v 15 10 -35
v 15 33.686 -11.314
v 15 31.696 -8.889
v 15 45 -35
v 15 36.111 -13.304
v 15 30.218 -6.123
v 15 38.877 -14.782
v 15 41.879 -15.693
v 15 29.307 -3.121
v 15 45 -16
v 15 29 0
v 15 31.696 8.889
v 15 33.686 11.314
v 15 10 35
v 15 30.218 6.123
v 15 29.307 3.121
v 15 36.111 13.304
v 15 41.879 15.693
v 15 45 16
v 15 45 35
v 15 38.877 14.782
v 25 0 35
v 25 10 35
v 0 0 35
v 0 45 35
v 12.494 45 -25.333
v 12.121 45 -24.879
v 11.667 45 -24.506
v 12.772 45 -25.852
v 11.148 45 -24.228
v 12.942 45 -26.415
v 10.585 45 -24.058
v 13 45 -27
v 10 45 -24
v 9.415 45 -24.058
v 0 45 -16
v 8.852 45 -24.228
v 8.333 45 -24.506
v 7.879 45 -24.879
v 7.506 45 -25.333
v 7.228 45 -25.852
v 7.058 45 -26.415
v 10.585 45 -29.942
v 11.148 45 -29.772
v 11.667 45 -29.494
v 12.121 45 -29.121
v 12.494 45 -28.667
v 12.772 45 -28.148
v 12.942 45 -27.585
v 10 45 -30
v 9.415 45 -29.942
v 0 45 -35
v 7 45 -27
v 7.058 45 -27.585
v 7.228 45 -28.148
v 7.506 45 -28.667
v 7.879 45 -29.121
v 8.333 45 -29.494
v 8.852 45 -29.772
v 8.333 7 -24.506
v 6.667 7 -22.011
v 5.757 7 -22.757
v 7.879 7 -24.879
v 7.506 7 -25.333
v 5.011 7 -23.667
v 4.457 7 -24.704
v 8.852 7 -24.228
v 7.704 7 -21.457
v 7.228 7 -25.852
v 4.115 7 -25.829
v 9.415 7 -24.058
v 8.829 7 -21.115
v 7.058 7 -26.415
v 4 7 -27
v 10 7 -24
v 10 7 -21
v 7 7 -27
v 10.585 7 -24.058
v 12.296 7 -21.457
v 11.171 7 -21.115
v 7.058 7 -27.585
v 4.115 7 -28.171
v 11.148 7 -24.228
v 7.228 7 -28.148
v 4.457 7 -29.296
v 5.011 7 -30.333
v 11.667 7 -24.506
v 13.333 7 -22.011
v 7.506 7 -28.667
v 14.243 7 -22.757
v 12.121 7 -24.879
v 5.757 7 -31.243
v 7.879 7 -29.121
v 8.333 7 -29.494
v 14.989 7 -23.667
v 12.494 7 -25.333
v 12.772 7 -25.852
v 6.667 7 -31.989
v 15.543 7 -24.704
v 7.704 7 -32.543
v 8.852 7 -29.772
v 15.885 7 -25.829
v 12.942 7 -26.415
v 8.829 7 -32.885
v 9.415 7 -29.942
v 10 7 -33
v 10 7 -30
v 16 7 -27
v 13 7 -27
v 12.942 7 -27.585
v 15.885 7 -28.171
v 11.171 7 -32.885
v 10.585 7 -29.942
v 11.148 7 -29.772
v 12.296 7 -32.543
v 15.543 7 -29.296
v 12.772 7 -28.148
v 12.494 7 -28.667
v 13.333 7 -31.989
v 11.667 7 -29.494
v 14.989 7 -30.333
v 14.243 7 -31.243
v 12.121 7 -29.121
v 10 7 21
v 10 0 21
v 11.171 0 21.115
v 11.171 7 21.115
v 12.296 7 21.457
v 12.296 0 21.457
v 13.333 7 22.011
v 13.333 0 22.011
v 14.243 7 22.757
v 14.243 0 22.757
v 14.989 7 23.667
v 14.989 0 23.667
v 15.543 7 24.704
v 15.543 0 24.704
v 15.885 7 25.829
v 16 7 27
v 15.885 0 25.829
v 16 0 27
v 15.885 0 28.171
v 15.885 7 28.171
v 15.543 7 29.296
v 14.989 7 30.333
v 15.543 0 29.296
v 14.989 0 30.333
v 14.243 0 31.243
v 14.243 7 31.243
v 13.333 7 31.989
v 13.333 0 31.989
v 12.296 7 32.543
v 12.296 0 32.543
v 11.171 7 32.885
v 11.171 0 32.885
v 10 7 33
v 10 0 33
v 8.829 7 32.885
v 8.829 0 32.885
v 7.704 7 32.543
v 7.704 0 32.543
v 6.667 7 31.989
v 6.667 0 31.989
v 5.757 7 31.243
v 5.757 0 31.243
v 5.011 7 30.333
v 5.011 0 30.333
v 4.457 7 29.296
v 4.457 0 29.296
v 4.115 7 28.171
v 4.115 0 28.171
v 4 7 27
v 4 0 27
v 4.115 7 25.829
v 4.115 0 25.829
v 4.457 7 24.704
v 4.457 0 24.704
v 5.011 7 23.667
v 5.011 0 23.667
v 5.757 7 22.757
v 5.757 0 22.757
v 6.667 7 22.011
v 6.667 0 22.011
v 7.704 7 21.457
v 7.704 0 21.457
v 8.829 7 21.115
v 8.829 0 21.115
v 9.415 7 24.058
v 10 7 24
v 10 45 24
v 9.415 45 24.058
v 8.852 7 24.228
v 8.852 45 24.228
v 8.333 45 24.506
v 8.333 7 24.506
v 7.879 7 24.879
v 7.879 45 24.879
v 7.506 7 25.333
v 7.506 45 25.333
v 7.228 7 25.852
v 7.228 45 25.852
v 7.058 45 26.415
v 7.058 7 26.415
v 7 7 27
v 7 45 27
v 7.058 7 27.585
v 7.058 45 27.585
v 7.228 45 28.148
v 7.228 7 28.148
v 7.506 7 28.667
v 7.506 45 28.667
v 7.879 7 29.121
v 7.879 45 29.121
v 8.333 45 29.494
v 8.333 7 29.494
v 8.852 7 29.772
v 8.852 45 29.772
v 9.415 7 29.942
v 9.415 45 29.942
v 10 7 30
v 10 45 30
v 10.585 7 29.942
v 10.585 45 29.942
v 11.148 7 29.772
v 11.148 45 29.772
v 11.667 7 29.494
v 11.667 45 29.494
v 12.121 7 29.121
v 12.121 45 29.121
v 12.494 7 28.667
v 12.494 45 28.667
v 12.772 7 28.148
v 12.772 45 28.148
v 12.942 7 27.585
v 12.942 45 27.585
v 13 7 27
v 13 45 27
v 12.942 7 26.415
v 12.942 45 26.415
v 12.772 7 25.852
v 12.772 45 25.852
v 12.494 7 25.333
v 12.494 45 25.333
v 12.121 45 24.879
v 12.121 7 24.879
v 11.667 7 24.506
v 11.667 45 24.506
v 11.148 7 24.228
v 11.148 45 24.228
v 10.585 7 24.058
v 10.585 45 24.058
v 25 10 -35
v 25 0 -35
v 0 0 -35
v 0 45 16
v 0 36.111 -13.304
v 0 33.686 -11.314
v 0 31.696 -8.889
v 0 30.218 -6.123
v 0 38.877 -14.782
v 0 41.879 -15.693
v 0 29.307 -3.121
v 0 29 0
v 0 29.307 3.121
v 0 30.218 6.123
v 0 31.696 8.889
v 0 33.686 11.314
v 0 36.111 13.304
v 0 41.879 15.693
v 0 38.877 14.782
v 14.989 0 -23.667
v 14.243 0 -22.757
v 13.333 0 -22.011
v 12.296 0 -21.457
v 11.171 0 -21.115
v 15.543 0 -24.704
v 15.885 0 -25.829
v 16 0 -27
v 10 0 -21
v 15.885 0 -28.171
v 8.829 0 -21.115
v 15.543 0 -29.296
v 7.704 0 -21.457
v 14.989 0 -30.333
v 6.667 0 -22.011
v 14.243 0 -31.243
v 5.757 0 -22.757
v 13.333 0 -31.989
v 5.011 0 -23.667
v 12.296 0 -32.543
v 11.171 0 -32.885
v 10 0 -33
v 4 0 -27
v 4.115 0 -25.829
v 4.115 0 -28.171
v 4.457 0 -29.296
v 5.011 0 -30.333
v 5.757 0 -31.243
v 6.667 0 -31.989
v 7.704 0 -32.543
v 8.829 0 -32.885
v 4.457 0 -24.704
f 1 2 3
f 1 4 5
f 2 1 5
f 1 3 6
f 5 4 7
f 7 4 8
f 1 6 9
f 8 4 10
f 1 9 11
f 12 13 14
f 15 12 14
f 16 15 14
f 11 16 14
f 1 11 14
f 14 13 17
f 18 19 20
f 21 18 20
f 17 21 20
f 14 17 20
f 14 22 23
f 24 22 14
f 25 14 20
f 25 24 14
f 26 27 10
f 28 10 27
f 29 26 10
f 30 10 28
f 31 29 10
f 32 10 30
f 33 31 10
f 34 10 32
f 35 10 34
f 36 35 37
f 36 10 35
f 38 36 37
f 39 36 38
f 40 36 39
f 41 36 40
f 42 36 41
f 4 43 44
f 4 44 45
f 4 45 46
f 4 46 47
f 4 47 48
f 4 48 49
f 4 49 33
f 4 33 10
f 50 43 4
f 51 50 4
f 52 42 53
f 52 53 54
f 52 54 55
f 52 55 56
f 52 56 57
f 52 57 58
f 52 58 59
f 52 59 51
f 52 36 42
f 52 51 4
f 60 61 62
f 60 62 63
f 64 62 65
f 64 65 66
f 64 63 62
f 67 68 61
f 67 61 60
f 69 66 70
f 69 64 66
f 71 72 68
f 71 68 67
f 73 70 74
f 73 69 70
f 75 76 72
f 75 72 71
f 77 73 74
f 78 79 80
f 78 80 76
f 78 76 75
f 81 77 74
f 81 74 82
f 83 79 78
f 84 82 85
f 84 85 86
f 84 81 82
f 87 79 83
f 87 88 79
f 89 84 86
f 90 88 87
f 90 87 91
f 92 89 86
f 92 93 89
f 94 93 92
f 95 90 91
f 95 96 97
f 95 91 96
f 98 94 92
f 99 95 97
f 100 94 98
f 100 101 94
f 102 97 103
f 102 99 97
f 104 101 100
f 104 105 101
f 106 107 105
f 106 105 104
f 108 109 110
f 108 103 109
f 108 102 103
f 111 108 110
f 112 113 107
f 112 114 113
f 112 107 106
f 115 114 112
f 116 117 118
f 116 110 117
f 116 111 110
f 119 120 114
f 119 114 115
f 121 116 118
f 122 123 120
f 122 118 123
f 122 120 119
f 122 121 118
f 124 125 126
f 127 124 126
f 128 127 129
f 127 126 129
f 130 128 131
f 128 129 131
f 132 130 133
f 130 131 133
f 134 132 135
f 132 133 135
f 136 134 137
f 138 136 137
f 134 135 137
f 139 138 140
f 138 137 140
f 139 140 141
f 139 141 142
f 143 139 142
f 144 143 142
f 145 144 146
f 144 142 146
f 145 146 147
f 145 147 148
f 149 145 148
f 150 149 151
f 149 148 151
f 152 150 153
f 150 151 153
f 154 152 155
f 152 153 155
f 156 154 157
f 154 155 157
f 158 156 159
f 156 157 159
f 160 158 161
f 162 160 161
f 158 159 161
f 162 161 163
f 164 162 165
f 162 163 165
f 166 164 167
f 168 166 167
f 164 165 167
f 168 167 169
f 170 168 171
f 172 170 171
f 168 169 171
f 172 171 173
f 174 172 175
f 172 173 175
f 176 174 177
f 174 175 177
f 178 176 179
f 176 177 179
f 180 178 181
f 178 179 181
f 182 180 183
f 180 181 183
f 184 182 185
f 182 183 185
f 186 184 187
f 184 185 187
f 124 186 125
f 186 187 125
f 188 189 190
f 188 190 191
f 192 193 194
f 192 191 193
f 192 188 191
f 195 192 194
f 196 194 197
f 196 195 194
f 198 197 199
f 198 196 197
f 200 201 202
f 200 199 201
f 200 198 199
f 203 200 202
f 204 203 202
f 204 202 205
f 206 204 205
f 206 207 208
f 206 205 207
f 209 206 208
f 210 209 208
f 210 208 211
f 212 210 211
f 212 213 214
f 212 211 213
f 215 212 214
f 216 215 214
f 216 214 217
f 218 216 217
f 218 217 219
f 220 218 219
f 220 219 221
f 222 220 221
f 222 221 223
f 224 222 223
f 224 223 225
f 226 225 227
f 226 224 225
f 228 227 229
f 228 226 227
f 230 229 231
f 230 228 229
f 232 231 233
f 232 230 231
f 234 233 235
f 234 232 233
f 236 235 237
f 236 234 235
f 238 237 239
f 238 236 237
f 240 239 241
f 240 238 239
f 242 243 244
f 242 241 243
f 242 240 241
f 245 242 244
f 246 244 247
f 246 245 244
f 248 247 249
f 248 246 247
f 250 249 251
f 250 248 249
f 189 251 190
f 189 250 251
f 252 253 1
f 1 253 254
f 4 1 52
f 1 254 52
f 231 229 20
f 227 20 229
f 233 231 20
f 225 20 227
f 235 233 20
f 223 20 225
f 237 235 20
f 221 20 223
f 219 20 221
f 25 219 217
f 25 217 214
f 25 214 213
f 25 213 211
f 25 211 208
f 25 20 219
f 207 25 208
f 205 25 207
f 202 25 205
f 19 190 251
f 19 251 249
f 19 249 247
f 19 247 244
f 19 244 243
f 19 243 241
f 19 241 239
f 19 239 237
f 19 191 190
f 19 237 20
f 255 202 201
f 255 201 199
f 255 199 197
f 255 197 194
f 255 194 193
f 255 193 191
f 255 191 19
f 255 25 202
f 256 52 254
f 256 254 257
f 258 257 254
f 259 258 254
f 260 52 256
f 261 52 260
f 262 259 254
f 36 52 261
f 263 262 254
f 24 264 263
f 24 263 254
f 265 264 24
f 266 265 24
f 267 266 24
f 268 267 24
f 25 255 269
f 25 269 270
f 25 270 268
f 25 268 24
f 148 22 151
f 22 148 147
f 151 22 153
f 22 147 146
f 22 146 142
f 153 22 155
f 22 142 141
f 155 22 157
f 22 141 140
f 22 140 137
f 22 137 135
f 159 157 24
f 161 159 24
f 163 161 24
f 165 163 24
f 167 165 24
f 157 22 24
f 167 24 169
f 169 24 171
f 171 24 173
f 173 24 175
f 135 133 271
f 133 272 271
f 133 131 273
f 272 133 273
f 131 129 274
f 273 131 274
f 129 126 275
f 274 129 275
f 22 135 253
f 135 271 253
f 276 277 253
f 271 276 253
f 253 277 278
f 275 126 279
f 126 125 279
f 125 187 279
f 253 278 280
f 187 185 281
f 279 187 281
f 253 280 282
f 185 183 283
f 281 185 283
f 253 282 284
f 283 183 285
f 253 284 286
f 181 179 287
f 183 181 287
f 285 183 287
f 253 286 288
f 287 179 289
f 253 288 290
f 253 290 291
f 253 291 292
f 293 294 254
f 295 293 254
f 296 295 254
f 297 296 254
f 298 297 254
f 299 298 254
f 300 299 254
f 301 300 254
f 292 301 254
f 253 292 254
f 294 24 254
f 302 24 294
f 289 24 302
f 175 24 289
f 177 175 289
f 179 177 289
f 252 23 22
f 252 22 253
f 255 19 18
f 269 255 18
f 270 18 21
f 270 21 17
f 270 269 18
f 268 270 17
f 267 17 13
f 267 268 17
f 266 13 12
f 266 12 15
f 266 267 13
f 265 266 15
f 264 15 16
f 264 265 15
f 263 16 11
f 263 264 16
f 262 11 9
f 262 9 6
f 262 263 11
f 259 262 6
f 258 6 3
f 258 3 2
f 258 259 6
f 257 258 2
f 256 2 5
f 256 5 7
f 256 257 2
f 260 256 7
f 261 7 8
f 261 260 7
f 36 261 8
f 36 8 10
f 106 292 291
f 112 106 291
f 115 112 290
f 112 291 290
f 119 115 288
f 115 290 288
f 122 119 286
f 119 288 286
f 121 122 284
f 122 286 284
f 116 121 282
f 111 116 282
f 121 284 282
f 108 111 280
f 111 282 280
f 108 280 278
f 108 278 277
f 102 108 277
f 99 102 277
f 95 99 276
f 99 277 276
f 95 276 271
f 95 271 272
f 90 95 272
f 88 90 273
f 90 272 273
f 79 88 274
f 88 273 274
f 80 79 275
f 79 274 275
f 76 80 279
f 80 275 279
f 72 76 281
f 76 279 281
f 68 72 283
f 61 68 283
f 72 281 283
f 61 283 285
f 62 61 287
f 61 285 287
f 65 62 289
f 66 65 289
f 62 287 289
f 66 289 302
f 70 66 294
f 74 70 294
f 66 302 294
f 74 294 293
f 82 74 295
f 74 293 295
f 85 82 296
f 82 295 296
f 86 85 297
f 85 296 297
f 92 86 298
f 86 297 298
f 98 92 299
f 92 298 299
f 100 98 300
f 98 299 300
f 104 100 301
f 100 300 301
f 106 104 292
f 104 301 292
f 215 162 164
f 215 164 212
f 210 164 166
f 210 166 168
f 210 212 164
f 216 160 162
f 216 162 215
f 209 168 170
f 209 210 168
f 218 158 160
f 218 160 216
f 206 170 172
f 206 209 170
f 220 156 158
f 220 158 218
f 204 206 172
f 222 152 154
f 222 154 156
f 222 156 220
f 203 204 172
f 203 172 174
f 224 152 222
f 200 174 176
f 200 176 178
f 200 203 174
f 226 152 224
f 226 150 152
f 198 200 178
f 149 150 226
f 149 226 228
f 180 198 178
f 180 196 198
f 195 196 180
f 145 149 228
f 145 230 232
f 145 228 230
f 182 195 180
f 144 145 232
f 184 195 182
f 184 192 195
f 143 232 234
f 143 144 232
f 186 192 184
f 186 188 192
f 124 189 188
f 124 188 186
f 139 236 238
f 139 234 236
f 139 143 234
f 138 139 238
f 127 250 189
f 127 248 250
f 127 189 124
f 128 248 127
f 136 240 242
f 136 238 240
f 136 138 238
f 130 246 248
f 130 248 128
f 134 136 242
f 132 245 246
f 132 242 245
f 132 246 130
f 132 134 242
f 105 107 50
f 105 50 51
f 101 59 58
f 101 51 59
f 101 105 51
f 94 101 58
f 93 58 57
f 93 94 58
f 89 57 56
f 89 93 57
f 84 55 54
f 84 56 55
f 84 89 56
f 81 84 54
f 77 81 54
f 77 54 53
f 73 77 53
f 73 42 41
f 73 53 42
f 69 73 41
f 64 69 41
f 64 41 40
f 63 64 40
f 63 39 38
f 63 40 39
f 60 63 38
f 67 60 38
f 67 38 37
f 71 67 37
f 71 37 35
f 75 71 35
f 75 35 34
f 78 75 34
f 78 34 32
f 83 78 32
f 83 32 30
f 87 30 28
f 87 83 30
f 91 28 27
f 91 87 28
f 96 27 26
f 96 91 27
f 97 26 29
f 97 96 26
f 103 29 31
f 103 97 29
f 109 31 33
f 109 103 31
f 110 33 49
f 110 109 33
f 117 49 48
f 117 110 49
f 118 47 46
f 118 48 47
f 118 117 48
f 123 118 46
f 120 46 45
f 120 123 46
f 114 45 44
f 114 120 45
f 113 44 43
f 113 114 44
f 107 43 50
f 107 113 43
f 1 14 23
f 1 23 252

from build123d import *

# Parameters (mm, degrees)
BOSS_EXTRUDE1_DEPTH = 15
SKETCH2_R           = 3
CUT_EXTRUDE1_DEPTH  = 59.949130613
SKETCH3_W           = 70
SKETCH3_H           = 10
BOSS_EXTRUDE2_DEPTH = 10
SKETCH4_R           = 6
CUT_EXTRUDE2_DEPTH  = 7


with BuildPart() as part:
    # Sketch1 → Boss-Extrude1 (new body)
    with BuildSketch(Plane(origin=(0, 0, 0), x_dir=(0, 0, -1), z_dir=(1, 0, 0))):
        with BuildLine():
            Line((16, 45), (35, 45))
            Line((35, 45), (35, 0))
            Line((35, 0), (-35, 0))
            Line((-35, 0), (-35, 45))
            Line((-35, 45), (-16, 45))
            ThreePointArc((-16, 45), (0, 29), (16, 45))
        make_face()
    extrude(amount=BOSS_EXTRUDE1_DEPTH)

    # Sketch2 → Cut-Extrude1 (cut, through all)
    with BuildSketch(Plane(origin=(0, 0, 0), x_dir=(1, 0, 0), z_dir=(0, 1, 0))):
        with Locations(Location((10, -27, 0), (0, 0, 90))):
            Circle(SKETCH2_R)
        with Locations(Location((10, 27, 0), (0, 0, 90))):
            Circle(SKETCH2_R)
    extrude(amount=CUT_EXTRUDE1_DEPTH, mode=Mode.SUBTRACT)

    # Sketch3 → Boss-Extrude2 (add)
    with BuildSketch(Plane(origin=(15, 0, 0), x_dir=(0, 0, -1), z_dir=(1, 0, 0))):
        with Locations((0, 5)):
            Rectangle(SKETCH3_W, SKETCH3_H)
    extrude(amount=BOSS_EXTRUDE2_DEPTH)

    # Sketch4 → Cut-Extrude2 (cut)
    with BuildSketch(Plane.XZ):
        with Locations(Location((10, 27, 0), (0, 0, 270))):
            Circle(SKETCH4_R)
        with Locations(Location((10, -27, 0), (0, 0, 270))):
            Circle(SKETCH4_R)
    extrude(amount=-CUT_EXTRUDE2_DEPTH, mode=Mode.SUBTRACT)


solid = part.part
